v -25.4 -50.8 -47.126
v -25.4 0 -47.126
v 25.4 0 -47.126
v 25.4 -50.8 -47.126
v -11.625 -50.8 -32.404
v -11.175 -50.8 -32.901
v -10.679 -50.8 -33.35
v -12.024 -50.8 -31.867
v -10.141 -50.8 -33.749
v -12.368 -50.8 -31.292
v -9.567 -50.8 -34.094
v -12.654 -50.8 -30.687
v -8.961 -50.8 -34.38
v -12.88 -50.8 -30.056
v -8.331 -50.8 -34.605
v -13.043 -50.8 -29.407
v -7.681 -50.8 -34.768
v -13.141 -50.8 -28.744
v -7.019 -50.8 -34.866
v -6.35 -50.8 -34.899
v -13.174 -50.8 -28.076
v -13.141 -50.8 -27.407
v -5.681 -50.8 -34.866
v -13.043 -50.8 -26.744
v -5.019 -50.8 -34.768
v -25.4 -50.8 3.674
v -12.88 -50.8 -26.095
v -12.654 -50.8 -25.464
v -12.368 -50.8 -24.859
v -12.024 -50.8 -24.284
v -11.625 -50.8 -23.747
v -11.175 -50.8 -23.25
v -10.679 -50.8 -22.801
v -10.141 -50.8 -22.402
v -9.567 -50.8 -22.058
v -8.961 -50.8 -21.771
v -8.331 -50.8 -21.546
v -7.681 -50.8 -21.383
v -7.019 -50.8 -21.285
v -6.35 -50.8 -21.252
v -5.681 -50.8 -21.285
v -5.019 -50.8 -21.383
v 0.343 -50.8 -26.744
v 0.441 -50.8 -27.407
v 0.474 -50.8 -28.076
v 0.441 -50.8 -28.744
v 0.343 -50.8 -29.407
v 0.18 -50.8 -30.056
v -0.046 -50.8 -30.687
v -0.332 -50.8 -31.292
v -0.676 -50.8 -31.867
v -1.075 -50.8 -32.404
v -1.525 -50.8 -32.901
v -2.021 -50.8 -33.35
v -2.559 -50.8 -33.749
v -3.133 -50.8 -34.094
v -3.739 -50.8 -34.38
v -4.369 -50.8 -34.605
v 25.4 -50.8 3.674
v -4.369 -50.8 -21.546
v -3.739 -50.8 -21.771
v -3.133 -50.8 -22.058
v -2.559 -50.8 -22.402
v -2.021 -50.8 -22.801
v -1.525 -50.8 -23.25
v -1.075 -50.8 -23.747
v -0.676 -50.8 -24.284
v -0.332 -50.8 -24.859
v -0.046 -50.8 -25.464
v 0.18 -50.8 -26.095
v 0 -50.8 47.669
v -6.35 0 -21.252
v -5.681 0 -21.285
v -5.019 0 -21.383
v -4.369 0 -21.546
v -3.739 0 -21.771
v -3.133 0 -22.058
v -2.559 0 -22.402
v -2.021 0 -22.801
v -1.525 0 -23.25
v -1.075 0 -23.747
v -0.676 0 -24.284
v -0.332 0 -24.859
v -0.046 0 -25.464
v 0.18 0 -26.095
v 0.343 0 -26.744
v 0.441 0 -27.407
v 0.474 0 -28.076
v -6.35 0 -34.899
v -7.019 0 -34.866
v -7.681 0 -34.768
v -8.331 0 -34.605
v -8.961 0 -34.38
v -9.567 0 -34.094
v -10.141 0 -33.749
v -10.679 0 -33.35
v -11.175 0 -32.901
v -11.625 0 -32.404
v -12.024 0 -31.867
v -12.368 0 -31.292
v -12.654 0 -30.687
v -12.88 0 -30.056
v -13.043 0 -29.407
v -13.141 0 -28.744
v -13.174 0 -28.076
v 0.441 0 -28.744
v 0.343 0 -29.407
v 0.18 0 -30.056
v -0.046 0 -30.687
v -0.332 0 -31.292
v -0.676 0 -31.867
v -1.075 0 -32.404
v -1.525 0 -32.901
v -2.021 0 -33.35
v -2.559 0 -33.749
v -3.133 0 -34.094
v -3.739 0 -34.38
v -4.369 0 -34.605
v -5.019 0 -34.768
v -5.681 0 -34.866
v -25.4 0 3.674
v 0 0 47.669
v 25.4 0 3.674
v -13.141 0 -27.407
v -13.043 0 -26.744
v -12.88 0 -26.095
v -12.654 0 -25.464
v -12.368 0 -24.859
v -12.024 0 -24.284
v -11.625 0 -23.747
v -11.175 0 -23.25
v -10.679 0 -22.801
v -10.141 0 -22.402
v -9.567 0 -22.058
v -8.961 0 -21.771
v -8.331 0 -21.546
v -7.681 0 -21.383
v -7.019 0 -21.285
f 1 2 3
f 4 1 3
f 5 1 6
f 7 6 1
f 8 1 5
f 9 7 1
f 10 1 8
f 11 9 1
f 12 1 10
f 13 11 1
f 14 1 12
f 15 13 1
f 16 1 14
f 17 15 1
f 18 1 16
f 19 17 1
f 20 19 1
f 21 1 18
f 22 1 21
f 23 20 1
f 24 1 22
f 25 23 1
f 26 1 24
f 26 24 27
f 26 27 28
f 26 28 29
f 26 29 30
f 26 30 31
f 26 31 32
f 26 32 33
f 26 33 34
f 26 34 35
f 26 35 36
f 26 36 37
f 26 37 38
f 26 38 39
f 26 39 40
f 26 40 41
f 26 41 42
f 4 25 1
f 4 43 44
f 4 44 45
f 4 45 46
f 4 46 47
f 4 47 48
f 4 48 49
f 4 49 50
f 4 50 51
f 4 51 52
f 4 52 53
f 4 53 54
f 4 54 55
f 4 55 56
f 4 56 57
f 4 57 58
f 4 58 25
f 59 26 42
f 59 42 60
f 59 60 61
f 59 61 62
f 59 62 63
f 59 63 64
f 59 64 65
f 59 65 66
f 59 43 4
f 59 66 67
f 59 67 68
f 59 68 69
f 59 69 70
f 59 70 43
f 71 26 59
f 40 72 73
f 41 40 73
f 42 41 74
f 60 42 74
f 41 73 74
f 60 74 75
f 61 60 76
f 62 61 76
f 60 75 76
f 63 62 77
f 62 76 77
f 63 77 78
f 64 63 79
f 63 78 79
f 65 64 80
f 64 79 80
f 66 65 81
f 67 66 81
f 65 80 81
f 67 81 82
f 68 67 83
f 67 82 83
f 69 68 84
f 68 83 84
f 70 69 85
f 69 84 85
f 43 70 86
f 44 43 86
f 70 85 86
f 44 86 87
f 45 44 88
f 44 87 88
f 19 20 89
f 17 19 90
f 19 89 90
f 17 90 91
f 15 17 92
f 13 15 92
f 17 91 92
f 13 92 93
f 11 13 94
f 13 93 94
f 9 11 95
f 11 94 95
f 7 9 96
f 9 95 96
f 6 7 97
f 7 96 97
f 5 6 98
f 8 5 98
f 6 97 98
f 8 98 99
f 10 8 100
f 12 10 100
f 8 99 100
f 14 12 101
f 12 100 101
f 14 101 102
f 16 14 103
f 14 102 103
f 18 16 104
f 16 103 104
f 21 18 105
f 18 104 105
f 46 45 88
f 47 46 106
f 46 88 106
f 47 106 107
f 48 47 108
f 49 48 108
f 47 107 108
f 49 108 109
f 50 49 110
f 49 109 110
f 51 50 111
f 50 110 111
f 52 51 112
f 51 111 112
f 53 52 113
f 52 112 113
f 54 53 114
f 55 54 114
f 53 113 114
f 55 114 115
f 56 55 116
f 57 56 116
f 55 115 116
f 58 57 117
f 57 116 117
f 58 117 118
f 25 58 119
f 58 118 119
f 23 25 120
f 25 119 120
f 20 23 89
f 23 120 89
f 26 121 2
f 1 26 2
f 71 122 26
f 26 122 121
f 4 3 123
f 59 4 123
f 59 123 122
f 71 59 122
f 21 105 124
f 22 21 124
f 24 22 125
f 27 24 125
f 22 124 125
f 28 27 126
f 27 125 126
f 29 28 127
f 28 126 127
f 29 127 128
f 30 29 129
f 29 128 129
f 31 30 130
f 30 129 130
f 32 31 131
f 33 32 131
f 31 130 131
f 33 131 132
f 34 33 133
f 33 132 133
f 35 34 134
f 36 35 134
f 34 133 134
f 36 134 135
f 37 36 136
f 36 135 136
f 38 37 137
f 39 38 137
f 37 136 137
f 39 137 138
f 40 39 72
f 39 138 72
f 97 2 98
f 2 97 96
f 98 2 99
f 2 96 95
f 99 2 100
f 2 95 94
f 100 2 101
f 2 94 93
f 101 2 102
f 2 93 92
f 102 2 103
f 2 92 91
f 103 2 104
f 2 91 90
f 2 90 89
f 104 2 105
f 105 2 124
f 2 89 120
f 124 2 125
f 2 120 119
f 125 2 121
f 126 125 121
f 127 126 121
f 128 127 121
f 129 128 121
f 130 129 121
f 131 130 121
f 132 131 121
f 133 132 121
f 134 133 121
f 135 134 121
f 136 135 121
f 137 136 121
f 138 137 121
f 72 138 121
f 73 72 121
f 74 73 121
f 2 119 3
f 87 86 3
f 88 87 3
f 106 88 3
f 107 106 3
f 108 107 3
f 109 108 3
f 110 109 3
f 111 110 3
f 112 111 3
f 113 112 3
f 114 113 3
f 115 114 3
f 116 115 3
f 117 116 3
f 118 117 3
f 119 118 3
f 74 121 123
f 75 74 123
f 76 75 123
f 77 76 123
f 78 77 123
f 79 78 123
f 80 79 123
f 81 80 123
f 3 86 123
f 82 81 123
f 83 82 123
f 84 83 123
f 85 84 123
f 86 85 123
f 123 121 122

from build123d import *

# Parameters (mm, degrees)
F1_DEPTH = 50.8


with BuildPart() as f1:
    # F0 (on Front) → F1 (new body)
    with BuildSketch(Plane.XZ):
        Polygon((0, 47.668528), (-25.4, 3.674437), (-6.35, 3.674437), (25.4, 3.674437), align=None)
        with BuildLine():
            Line((-6.35, 3.674437), (-25.4, 3.674437))
            Line((-25.4, 3.674437), (-25.4, -28.075563))
            Line((-25.4, -28.075563), (-13.173735, -28.075563))
            ThreePointArc((-13.173735, -28.075563), (-11.17511, -23.250453), (-6.35, -21.251827))
            Line((-6.35, -21.251827), (-6.35, 3.674437))
        make_face()
        with BuildLine():
            Line((25.4, 3.674437), (-6.35, 3.674437))
            Line((-6.35, 3.674437), (-6.35, -21.251827))
            ThreePointArc((-6.35, -21.251827), (-1.52489, -23.250453), (0.473735, -28.075563))
            Line((0.473735, -28.075563), (25.4, -28.075563))
            Line((25.4, -28.075563), (25.4, 3.674437))
        make_face()
        with BuildLine():
            Line((-13.173735, -28.075563), (-25.4, -28.075563))
            Line((-25.4, -28.075563), (-25.4, -47.125563))
            Line((-25.4, -47.125563), (-6.35, -47.125563))
            Line((-6.35, -47.125563), (-6.35, -34.899298))
            ThreePointArc((-6.35, -34.899298), (-11.17511, -32.900672), (-13.173735, -28.075563))
        make_face()
        with BuildLine():
            Line((25.4, -47.125563), (25.4, -28.075563))
            Line((25.4, -28.075563), (0.473735, -28.075563))
            ThreePointArc((0.473735, -28.075563), (-1.52489, -32.900672), (-6.35, -34.899298))
            Line((-6.35, -34.899298), (-6.35, -47.125563))
            Line((-6.35, -47.125563), (25.4, -47.125563))
        make_face()
    extrude(amount=F1_DEPTH)


solid = f1.part
